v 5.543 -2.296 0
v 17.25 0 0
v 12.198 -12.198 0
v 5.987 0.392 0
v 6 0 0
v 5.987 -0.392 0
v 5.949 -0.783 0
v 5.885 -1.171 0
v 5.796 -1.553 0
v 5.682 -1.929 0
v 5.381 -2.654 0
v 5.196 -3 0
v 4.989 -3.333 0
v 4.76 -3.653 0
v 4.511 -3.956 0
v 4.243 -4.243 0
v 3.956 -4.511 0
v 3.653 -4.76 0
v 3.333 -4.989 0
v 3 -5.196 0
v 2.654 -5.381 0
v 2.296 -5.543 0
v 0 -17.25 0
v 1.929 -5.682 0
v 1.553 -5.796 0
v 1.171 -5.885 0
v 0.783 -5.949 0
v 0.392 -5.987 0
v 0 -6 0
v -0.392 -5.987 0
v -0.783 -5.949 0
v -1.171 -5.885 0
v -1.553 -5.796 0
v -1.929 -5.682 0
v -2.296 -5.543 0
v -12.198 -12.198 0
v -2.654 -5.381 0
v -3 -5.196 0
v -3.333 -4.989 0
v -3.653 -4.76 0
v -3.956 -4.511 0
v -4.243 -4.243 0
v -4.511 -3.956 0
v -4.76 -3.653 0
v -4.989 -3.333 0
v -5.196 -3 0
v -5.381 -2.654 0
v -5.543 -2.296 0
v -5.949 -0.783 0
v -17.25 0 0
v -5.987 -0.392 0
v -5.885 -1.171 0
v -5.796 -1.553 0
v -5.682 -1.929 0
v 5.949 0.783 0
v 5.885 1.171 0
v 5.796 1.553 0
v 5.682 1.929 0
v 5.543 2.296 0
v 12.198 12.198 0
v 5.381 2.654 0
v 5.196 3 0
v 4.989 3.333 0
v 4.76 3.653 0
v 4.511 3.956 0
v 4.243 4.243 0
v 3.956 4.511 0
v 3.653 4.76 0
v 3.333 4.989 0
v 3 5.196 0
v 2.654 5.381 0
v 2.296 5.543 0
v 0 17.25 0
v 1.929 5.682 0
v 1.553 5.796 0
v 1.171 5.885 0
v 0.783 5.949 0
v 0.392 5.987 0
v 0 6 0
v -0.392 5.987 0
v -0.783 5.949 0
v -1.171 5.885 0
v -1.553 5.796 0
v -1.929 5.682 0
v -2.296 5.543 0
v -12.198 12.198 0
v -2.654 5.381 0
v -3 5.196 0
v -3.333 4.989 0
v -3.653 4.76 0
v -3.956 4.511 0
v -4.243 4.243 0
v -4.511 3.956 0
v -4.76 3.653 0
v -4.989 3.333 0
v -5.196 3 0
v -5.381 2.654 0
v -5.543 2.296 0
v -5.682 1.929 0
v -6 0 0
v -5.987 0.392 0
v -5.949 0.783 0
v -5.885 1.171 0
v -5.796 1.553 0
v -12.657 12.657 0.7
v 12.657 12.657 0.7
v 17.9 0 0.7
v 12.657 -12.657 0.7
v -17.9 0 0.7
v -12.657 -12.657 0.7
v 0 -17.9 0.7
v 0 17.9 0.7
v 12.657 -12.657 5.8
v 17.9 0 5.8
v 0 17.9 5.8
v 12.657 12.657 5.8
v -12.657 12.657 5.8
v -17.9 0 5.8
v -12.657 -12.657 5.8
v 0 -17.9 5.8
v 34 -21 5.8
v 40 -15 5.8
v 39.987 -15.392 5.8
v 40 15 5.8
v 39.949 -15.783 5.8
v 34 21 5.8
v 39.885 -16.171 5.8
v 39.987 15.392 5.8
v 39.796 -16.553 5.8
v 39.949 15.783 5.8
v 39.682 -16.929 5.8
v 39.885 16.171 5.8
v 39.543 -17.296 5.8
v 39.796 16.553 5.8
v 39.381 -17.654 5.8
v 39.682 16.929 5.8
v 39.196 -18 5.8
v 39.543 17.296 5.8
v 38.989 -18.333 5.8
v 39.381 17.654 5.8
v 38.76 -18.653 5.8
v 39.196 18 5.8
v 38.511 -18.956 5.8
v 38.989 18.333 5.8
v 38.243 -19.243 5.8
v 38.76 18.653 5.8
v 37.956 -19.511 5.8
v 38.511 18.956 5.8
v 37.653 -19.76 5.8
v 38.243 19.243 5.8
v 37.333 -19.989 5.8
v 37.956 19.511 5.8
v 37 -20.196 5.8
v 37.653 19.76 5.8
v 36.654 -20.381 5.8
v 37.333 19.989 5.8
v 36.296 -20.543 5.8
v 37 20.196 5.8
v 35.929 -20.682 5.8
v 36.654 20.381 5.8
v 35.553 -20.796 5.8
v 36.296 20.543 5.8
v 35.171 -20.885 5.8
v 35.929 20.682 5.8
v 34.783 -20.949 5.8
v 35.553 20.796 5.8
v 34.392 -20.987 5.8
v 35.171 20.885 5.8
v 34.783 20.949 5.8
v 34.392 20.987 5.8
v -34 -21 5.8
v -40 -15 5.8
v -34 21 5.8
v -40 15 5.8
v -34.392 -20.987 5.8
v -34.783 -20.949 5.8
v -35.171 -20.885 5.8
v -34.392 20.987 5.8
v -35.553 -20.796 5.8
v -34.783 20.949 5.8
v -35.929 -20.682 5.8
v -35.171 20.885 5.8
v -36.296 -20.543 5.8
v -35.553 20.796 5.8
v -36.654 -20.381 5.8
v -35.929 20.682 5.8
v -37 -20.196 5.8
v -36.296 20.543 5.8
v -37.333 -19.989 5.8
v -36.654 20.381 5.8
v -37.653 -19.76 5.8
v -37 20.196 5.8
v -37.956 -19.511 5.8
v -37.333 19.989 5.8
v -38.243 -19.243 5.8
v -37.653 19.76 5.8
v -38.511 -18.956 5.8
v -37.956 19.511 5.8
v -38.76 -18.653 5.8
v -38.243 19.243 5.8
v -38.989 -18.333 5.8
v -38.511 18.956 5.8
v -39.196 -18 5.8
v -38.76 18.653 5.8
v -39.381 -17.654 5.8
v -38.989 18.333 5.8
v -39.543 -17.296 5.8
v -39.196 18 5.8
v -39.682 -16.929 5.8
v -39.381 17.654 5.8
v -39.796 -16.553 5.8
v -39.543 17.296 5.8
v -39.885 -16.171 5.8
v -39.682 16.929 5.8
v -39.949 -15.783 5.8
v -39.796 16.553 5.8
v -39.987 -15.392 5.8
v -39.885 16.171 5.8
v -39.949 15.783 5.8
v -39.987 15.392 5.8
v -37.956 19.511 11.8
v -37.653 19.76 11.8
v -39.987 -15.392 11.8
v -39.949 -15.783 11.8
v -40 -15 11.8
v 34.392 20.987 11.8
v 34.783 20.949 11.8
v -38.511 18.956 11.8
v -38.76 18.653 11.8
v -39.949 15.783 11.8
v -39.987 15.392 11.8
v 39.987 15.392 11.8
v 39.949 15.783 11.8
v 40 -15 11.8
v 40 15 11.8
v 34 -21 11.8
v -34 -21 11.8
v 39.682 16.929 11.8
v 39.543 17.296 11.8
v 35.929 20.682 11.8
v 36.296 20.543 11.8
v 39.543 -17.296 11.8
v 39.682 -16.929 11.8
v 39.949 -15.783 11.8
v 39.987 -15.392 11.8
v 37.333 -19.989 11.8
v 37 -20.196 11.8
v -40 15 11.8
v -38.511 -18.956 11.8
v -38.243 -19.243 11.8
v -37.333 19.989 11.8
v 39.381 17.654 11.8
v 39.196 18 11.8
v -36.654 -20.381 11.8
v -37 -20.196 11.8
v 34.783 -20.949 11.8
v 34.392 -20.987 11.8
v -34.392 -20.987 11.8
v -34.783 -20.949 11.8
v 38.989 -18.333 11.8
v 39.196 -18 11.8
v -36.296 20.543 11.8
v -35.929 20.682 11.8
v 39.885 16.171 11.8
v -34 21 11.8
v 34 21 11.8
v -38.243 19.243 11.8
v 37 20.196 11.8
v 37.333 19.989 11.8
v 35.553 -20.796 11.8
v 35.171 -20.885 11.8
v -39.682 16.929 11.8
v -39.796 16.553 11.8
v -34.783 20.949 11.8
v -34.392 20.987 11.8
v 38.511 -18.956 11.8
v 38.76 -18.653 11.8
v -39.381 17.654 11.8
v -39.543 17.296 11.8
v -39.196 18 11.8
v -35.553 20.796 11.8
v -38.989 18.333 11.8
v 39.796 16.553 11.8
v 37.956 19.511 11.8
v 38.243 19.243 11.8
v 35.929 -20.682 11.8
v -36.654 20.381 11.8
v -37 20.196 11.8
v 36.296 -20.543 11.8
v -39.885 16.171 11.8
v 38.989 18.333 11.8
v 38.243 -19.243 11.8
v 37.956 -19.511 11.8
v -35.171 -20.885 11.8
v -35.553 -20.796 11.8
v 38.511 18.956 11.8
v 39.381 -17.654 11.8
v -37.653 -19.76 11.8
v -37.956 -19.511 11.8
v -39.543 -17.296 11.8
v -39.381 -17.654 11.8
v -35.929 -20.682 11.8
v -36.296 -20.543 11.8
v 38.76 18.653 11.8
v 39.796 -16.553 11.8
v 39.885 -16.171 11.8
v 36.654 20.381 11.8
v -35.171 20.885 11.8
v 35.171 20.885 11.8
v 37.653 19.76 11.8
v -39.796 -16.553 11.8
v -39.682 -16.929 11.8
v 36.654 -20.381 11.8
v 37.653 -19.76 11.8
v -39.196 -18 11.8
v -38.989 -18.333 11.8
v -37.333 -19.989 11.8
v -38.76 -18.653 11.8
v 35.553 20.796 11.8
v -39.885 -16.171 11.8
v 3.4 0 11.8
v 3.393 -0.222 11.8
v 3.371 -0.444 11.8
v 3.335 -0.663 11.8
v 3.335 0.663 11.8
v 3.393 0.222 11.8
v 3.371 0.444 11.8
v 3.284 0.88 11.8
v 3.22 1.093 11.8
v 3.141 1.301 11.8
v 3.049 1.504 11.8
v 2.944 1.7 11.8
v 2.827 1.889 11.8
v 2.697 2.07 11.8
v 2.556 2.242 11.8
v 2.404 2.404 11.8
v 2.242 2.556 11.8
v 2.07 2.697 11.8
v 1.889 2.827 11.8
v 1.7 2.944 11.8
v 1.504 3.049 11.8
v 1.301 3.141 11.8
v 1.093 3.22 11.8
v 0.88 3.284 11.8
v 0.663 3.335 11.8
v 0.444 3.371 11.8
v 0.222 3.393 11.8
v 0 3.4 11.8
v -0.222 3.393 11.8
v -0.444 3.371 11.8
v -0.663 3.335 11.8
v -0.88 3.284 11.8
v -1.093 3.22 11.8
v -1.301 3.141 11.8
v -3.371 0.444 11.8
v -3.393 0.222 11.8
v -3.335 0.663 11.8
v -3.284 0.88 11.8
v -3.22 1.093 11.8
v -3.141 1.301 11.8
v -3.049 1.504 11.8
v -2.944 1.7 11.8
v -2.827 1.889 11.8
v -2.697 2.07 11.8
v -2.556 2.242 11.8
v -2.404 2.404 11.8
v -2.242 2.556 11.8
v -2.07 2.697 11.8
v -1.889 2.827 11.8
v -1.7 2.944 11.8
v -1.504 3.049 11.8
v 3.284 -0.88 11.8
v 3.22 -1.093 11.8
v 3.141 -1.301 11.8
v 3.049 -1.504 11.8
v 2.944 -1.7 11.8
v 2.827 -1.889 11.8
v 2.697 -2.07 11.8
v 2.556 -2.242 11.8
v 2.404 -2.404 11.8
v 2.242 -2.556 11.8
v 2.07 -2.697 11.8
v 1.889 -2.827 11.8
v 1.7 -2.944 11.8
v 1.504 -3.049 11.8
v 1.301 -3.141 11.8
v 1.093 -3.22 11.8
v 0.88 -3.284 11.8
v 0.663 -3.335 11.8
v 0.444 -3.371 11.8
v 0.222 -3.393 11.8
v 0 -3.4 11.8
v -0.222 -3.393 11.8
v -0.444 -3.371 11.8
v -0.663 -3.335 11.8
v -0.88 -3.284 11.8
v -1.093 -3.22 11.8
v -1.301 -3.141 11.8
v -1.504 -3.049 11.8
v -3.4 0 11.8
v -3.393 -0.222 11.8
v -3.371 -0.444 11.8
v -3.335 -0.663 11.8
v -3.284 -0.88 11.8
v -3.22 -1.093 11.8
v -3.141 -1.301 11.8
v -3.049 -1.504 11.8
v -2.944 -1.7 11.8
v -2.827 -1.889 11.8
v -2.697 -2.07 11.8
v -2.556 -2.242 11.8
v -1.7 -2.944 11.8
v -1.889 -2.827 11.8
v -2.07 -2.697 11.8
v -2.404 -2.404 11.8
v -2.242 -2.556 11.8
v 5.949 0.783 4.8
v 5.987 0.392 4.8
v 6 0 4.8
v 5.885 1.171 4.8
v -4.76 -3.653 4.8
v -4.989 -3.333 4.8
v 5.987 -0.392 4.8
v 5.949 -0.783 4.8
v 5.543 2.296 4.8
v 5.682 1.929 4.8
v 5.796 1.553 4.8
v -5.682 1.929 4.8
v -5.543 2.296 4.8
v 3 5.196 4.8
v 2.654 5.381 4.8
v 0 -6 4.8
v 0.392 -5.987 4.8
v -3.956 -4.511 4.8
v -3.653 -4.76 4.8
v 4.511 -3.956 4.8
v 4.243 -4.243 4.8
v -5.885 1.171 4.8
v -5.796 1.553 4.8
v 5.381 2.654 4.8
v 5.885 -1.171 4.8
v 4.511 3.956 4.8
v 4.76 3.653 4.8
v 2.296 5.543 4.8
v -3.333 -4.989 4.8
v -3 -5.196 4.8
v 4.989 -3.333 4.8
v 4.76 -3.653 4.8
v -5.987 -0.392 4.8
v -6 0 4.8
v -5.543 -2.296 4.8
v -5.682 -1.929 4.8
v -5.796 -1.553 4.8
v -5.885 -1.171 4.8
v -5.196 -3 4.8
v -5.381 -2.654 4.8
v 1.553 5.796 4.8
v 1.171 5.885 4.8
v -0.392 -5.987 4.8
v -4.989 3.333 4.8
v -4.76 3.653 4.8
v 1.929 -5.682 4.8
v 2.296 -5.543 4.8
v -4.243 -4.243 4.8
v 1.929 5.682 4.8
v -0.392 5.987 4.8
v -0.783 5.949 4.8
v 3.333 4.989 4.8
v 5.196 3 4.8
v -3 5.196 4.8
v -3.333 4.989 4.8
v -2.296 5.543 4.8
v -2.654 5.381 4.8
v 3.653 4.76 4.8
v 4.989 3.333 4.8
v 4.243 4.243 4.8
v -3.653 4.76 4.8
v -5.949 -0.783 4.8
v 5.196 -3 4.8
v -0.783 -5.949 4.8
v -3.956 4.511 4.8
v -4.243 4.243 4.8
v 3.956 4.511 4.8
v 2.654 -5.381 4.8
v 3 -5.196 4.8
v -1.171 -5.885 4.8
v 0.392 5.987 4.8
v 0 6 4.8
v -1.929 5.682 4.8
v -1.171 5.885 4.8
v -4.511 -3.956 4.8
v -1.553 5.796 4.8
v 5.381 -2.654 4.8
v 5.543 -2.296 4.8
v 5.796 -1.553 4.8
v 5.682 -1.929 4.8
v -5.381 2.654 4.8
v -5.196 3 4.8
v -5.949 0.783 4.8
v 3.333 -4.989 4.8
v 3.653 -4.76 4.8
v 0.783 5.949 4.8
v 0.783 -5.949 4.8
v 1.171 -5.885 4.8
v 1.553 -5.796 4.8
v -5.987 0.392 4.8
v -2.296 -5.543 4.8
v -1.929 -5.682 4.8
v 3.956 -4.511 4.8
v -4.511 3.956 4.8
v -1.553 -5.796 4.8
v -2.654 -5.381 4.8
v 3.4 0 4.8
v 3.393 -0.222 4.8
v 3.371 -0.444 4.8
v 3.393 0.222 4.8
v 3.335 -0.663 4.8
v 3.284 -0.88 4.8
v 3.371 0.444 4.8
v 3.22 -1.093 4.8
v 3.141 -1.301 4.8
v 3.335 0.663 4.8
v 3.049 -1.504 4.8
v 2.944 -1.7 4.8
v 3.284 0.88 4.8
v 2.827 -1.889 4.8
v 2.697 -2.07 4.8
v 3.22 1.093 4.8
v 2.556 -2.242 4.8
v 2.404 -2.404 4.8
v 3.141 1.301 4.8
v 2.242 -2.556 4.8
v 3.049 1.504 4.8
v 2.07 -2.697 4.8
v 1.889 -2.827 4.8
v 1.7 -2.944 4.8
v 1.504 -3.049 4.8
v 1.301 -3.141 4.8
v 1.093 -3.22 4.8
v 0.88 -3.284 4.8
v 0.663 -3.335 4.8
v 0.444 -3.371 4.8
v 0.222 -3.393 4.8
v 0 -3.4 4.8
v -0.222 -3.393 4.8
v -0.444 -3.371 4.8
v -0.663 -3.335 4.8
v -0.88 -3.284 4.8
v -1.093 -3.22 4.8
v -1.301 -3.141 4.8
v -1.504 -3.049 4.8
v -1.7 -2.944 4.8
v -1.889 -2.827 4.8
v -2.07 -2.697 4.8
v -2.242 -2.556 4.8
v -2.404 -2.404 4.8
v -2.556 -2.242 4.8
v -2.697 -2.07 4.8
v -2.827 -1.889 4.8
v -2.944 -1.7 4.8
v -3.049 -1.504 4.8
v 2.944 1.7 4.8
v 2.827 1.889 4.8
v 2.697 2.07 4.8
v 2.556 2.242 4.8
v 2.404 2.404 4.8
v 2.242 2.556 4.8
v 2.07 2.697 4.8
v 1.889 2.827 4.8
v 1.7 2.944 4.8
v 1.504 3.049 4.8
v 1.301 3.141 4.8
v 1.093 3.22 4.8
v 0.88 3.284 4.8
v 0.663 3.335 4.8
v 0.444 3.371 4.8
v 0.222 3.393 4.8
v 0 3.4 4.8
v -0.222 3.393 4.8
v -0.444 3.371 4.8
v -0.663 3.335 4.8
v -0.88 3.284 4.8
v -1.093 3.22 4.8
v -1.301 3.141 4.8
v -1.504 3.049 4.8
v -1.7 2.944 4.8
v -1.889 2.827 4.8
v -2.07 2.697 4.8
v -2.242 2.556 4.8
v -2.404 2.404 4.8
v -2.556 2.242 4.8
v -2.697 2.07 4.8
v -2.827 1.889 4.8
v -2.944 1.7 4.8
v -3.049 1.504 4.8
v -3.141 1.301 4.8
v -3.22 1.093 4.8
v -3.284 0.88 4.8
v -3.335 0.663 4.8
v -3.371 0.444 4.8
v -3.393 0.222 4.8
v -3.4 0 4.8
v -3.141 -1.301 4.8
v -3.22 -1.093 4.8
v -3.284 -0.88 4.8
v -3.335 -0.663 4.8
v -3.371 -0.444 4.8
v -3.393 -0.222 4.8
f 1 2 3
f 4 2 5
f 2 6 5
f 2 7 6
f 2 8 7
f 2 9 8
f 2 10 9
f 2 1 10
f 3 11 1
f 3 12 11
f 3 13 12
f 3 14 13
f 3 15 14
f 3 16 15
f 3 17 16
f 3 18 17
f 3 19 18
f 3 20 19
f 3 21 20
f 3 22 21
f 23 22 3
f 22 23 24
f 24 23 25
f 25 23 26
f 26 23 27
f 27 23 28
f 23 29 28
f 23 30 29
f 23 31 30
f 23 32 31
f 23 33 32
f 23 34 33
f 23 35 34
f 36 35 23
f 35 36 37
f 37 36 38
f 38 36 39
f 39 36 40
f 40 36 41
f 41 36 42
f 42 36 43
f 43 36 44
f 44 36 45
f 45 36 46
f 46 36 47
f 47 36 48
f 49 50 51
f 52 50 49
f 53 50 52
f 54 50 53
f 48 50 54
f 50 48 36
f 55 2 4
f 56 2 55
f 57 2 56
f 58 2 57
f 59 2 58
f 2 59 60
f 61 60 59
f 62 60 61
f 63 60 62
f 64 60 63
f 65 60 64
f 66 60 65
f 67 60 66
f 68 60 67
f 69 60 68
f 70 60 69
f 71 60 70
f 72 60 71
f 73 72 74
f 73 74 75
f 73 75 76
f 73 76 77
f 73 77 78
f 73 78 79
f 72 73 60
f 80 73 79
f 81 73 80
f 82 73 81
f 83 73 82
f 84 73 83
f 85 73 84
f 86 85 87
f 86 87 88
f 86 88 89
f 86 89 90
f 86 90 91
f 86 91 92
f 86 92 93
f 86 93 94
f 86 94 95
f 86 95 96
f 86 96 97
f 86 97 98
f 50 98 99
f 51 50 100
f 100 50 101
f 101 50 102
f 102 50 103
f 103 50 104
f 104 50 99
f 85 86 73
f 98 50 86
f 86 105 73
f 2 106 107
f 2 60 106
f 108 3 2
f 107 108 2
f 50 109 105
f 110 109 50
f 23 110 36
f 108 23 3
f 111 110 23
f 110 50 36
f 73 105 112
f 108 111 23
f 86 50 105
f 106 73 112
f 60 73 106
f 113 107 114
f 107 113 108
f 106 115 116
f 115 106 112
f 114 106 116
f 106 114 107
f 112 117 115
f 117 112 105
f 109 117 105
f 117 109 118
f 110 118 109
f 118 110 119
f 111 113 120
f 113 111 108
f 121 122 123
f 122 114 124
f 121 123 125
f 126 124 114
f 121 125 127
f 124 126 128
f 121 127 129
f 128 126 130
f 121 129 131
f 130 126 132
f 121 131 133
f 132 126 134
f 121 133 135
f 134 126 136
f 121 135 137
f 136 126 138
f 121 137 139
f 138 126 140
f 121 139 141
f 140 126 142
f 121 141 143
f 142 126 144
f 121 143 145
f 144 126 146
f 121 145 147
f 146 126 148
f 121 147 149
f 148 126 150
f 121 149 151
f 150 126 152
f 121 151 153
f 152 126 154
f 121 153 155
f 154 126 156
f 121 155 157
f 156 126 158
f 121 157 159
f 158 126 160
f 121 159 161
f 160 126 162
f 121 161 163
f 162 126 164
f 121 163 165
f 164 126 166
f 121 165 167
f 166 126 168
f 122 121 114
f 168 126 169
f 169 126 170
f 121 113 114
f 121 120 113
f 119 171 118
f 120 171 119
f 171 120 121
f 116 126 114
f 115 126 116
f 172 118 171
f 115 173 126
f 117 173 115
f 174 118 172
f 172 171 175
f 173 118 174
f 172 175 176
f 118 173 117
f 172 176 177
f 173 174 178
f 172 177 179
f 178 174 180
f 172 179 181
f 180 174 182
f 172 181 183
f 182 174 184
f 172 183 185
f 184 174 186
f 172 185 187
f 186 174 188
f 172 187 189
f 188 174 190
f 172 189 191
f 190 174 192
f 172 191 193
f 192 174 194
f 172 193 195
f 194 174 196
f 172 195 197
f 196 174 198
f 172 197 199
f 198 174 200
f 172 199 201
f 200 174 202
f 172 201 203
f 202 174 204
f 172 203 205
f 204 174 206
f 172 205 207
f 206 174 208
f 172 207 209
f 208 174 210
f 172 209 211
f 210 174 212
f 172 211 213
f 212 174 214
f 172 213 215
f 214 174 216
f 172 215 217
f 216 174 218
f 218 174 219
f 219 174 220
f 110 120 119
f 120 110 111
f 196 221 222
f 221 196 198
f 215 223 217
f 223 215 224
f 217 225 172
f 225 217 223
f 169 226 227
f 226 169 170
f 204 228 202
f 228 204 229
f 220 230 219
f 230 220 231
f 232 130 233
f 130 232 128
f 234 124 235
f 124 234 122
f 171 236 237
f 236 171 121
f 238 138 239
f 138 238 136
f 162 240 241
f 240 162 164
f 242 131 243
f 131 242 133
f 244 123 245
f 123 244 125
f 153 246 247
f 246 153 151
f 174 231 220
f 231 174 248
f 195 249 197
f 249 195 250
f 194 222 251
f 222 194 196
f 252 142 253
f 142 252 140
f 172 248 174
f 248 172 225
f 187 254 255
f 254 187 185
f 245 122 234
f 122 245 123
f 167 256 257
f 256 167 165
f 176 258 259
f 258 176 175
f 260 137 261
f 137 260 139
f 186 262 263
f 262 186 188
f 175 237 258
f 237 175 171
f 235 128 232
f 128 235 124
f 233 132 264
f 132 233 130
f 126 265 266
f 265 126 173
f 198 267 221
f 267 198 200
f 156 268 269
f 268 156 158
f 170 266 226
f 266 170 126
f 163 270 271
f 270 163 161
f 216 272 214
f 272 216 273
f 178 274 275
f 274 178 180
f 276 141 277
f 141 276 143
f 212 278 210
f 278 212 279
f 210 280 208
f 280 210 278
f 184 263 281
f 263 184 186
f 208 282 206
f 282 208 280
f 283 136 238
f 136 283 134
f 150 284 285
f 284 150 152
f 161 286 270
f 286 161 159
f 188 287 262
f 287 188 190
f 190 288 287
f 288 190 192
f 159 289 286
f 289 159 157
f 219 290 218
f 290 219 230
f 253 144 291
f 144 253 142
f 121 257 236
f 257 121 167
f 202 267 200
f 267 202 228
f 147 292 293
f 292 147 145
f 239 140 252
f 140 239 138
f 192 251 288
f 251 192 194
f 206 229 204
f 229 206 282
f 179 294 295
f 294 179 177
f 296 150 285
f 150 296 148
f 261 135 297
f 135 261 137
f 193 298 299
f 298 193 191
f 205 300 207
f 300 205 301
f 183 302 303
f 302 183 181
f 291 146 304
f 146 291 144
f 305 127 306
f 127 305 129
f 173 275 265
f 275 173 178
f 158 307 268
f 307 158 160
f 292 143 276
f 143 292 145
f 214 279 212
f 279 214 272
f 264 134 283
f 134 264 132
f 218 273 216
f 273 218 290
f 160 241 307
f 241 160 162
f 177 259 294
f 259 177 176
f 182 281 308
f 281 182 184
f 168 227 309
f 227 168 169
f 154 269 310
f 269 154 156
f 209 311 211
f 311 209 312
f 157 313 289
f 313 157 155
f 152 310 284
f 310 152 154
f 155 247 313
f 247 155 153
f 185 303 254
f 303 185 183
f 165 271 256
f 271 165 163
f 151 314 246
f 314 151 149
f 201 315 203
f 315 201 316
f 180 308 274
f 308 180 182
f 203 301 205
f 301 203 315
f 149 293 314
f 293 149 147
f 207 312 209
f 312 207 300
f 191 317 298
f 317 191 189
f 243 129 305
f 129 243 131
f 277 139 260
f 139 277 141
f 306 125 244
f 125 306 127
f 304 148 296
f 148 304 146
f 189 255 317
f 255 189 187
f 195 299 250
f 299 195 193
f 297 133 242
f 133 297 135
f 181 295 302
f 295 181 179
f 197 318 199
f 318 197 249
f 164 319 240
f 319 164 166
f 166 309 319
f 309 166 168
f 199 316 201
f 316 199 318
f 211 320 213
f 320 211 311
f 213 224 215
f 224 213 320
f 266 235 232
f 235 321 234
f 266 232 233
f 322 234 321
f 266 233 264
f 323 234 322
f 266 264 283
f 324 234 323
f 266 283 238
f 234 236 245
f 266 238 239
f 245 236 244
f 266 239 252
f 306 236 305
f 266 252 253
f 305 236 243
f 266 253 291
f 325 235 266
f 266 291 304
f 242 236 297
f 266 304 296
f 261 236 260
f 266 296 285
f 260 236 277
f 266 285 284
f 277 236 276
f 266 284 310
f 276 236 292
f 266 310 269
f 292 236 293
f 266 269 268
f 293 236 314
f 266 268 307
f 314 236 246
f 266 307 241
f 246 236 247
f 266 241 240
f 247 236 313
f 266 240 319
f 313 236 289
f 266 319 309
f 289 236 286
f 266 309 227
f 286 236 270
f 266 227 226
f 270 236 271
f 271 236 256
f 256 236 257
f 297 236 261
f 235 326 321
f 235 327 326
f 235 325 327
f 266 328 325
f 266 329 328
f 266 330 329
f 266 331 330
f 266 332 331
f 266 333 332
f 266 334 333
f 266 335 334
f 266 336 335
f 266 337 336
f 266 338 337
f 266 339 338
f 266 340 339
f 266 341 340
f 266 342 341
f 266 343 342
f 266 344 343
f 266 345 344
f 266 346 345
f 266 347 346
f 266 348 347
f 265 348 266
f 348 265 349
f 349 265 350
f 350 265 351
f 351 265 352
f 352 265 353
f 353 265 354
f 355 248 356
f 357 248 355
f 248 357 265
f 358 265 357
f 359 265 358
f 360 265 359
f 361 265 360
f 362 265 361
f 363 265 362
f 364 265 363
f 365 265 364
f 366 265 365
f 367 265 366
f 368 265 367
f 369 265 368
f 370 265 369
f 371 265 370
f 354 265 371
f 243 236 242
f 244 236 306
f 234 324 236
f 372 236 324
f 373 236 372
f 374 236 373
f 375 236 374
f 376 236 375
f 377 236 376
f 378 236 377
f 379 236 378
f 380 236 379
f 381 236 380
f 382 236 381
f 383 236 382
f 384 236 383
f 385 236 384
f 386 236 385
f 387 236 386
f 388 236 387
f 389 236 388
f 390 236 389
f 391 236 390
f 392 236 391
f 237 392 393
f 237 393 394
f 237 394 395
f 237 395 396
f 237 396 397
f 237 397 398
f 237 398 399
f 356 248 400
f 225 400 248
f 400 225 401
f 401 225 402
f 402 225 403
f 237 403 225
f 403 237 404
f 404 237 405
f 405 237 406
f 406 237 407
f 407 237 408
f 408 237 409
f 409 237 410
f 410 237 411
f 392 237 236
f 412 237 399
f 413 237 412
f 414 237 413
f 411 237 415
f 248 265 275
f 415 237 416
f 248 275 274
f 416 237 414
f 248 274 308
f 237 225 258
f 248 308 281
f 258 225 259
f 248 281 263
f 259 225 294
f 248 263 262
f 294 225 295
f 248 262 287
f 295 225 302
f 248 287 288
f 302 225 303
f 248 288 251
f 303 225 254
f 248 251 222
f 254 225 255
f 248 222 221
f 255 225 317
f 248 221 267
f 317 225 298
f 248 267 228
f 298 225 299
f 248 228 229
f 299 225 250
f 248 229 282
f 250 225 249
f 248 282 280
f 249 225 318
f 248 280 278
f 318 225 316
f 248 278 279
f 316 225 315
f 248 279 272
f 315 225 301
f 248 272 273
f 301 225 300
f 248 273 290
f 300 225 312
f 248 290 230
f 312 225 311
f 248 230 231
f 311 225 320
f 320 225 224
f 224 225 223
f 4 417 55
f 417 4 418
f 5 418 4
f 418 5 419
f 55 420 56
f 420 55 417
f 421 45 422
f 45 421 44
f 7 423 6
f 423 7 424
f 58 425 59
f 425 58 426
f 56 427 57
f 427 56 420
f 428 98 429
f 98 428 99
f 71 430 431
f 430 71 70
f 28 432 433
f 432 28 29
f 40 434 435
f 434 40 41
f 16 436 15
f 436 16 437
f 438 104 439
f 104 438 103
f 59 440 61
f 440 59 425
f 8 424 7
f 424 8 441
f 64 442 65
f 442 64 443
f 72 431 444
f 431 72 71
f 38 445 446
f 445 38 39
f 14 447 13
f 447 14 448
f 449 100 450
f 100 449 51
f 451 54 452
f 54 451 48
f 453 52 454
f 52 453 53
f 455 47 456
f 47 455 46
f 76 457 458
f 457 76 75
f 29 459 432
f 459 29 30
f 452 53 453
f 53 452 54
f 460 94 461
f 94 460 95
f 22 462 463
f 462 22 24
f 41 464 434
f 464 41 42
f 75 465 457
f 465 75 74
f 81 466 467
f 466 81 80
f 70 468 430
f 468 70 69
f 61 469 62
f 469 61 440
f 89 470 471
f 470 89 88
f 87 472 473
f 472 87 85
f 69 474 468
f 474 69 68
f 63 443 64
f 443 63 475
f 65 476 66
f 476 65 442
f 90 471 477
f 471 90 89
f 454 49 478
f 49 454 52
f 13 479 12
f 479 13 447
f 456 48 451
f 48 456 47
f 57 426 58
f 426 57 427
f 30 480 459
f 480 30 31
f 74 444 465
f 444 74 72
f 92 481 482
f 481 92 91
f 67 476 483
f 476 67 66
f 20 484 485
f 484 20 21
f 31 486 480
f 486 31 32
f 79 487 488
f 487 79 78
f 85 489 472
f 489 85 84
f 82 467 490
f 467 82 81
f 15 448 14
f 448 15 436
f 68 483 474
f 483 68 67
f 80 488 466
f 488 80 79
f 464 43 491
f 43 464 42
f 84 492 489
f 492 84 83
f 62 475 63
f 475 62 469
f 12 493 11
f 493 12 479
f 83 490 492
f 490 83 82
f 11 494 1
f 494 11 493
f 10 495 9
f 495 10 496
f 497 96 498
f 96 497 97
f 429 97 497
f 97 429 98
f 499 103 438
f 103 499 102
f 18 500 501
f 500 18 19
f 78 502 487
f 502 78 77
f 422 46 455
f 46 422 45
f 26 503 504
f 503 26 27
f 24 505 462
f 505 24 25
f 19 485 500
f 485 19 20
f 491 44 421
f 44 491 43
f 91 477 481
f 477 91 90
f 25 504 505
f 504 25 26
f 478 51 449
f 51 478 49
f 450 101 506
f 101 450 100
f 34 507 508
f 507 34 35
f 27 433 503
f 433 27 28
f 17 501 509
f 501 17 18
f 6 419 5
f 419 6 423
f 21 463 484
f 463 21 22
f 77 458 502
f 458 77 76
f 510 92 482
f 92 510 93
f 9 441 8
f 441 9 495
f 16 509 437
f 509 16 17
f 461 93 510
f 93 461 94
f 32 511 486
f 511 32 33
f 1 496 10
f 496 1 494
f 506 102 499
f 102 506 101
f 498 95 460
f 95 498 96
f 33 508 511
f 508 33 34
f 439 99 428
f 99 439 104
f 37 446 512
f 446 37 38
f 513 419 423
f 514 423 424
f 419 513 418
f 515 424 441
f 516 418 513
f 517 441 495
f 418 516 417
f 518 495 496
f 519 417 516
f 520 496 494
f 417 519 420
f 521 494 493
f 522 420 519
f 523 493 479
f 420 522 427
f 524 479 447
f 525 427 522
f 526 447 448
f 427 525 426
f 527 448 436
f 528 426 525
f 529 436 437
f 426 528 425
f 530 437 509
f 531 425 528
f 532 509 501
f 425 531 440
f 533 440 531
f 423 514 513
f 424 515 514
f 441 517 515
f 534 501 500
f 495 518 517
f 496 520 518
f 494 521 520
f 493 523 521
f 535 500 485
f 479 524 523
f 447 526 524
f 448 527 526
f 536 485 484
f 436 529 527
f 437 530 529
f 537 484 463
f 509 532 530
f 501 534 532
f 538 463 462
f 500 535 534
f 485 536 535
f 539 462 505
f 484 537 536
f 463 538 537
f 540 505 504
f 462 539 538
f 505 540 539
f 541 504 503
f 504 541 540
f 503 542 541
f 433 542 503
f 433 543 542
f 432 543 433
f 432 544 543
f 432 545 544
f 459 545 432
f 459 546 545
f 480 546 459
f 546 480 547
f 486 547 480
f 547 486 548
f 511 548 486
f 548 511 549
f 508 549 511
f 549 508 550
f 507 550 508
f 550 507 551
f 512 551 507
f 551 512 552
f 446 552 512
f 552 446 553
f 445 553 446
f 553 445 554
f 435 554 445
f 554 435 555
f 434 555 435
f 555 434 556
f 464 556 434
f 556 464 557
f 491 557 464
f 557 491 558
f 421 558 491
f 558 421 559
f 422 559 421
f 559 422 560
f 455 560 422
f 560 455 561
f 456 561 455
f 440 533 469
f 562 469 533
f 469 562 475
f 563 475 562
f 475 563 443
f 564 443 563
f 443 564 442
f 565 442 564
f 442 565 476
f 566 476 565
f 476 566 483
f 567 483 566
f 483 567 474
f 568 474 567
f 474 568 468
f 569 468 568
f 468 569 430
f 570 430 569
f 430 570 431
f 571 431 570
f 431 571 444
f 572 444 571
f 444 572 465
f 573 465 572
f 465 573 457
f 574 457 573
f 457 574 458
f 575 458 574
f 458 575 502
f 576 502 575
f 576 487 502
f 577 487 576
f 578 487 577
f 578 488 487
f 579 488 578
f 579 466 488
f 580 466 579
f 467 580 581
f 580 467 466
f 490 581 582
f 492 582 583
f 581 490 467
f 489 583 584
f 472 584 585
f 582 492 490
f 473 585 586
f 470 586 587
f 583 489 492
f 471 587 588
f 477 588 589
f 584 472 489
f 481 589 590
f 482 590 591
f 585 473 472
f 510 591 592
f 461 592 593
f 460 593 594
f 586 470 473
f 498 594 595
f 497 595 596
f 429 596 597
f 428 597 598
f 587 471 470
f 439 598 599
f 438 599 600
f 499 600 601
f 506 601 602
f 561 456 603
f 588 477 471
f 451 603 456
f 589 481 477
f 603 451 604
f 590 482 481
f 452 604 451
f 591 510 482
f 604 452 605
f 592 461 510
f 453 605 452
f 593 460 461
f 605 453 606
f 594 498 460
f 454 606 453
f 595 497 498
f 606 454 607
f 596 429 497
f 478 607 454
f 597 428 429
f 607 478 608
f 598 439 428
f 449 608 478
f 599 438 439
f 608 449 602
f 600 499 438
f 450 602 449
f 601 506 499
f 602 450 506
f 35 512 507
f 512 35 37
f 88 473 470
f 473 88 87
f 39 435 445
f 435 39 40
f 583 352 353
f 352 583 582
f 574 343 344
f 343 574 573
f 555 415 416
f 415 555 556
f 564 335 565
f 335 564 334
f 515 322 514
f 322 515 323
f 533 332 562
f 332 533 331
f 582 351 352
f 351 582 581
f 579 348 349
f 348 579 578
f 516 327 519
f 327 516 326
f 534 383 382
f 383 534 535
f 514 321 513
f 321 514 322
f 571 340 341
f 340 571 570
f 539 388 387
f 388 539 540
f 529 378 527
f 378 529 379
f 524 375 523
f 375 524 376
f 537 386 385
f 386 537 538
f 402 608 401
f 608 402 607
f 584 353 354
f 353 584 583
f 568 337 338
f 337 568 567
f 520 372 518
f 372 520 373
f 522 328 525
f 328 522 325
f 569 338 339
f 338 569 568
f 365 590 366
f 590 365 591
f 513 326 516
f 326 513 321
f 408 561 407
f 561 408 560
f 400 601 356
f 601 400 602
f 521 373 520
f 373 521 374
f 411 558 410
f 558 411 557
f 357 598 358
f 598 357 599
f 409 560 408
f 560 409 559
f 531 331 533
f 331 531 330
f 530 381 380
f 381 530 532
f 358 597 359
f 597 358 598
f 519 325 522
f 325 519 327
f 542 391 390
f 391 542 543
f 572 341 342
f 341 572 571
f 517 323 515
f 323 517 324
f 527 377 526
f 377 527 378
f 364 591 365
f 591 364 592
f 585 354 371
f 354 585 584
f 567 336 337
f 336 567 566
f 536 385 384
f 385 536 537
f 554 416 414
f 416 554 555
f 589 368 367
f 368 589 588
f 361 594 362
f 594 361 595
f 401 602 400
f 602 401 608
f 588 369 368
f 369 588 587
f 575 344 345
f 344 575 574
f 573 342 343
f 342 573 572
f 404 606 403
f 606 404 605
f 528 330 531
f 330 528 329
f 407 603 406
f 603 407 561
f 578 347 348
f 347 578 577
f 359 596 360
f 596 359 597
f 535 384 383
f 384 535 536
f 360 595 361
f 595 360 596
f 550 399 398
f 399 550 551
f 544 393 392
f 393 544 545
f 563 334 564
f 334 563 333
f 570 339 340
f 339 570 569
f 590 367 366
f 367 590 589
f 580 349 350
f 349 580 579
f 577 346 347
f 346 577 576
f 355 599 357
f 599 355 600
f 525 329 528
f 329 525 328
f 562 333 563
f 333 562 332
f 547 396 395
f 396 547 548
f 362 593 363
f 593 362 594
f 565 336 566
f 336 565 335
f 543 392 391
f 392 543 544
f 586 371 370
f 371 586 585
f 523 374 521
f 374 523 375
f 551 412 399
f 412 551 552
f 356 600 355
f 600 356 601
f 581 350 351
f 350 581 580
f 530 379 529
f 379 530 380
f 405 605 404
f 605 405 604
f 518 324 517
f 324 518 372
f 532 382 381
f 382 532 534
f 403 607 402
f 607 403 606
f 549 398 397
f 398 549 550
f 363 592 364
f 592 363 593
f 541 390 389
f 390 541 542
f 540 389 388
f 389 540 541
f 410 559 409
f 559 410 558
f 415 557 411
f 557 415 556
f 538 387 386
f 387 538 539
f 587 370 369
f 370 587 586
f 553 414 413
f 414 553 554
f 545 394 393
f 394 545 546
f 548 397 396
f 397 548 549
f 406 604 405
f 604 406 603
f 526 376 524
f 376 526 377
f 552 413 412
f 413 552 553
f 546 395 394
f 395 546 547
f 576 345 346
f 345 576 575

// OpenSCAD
// Parametric ZED 2i adapter for MakerWorld universal octagon socket.
// Units: mm. Export the STL with $fn=96 for smooth screw holes.
$fn = 96;

fit = "standard"; // "standard" or "loose"
peg_r = fit == "loose" ? 17.75 : 17.90;
peg_h = 5.8;
plate_x = 80;
plate_y = 42;
plate_h = 6;
corner_r = 6;

module rounded_box_2d(x, y, r) {
    hull()
        for (sx = [-1, 1], sy = [-1, 1])
            translate([sx * (x/2-r), sy * (y/2-r)]) circle(r=r);
}

module chamfered_octagon(r, h) {
    union() {
        cylinder(h=0.7, r1=r-0.65, r2=r, $fn=8);
        translate([0,0,0.7]) cylinder(h=h-0.7, r=r, $fn=8);
    }
}

difference() {
    union() {
        chamfered_octagon(peg_r, peg_h);
        translate([0,0,peg_h])
            linear_extrude(height=plate_h) rounded_box_2d(plate_x, plate_y, corner_r);
    }
    translate([0,0,-0.1]) cylinder(h=4.9, d=12.0);
    translate([0,0,4.79]) cylinder(h=plate_h+peg_h, d=6.8);
}
